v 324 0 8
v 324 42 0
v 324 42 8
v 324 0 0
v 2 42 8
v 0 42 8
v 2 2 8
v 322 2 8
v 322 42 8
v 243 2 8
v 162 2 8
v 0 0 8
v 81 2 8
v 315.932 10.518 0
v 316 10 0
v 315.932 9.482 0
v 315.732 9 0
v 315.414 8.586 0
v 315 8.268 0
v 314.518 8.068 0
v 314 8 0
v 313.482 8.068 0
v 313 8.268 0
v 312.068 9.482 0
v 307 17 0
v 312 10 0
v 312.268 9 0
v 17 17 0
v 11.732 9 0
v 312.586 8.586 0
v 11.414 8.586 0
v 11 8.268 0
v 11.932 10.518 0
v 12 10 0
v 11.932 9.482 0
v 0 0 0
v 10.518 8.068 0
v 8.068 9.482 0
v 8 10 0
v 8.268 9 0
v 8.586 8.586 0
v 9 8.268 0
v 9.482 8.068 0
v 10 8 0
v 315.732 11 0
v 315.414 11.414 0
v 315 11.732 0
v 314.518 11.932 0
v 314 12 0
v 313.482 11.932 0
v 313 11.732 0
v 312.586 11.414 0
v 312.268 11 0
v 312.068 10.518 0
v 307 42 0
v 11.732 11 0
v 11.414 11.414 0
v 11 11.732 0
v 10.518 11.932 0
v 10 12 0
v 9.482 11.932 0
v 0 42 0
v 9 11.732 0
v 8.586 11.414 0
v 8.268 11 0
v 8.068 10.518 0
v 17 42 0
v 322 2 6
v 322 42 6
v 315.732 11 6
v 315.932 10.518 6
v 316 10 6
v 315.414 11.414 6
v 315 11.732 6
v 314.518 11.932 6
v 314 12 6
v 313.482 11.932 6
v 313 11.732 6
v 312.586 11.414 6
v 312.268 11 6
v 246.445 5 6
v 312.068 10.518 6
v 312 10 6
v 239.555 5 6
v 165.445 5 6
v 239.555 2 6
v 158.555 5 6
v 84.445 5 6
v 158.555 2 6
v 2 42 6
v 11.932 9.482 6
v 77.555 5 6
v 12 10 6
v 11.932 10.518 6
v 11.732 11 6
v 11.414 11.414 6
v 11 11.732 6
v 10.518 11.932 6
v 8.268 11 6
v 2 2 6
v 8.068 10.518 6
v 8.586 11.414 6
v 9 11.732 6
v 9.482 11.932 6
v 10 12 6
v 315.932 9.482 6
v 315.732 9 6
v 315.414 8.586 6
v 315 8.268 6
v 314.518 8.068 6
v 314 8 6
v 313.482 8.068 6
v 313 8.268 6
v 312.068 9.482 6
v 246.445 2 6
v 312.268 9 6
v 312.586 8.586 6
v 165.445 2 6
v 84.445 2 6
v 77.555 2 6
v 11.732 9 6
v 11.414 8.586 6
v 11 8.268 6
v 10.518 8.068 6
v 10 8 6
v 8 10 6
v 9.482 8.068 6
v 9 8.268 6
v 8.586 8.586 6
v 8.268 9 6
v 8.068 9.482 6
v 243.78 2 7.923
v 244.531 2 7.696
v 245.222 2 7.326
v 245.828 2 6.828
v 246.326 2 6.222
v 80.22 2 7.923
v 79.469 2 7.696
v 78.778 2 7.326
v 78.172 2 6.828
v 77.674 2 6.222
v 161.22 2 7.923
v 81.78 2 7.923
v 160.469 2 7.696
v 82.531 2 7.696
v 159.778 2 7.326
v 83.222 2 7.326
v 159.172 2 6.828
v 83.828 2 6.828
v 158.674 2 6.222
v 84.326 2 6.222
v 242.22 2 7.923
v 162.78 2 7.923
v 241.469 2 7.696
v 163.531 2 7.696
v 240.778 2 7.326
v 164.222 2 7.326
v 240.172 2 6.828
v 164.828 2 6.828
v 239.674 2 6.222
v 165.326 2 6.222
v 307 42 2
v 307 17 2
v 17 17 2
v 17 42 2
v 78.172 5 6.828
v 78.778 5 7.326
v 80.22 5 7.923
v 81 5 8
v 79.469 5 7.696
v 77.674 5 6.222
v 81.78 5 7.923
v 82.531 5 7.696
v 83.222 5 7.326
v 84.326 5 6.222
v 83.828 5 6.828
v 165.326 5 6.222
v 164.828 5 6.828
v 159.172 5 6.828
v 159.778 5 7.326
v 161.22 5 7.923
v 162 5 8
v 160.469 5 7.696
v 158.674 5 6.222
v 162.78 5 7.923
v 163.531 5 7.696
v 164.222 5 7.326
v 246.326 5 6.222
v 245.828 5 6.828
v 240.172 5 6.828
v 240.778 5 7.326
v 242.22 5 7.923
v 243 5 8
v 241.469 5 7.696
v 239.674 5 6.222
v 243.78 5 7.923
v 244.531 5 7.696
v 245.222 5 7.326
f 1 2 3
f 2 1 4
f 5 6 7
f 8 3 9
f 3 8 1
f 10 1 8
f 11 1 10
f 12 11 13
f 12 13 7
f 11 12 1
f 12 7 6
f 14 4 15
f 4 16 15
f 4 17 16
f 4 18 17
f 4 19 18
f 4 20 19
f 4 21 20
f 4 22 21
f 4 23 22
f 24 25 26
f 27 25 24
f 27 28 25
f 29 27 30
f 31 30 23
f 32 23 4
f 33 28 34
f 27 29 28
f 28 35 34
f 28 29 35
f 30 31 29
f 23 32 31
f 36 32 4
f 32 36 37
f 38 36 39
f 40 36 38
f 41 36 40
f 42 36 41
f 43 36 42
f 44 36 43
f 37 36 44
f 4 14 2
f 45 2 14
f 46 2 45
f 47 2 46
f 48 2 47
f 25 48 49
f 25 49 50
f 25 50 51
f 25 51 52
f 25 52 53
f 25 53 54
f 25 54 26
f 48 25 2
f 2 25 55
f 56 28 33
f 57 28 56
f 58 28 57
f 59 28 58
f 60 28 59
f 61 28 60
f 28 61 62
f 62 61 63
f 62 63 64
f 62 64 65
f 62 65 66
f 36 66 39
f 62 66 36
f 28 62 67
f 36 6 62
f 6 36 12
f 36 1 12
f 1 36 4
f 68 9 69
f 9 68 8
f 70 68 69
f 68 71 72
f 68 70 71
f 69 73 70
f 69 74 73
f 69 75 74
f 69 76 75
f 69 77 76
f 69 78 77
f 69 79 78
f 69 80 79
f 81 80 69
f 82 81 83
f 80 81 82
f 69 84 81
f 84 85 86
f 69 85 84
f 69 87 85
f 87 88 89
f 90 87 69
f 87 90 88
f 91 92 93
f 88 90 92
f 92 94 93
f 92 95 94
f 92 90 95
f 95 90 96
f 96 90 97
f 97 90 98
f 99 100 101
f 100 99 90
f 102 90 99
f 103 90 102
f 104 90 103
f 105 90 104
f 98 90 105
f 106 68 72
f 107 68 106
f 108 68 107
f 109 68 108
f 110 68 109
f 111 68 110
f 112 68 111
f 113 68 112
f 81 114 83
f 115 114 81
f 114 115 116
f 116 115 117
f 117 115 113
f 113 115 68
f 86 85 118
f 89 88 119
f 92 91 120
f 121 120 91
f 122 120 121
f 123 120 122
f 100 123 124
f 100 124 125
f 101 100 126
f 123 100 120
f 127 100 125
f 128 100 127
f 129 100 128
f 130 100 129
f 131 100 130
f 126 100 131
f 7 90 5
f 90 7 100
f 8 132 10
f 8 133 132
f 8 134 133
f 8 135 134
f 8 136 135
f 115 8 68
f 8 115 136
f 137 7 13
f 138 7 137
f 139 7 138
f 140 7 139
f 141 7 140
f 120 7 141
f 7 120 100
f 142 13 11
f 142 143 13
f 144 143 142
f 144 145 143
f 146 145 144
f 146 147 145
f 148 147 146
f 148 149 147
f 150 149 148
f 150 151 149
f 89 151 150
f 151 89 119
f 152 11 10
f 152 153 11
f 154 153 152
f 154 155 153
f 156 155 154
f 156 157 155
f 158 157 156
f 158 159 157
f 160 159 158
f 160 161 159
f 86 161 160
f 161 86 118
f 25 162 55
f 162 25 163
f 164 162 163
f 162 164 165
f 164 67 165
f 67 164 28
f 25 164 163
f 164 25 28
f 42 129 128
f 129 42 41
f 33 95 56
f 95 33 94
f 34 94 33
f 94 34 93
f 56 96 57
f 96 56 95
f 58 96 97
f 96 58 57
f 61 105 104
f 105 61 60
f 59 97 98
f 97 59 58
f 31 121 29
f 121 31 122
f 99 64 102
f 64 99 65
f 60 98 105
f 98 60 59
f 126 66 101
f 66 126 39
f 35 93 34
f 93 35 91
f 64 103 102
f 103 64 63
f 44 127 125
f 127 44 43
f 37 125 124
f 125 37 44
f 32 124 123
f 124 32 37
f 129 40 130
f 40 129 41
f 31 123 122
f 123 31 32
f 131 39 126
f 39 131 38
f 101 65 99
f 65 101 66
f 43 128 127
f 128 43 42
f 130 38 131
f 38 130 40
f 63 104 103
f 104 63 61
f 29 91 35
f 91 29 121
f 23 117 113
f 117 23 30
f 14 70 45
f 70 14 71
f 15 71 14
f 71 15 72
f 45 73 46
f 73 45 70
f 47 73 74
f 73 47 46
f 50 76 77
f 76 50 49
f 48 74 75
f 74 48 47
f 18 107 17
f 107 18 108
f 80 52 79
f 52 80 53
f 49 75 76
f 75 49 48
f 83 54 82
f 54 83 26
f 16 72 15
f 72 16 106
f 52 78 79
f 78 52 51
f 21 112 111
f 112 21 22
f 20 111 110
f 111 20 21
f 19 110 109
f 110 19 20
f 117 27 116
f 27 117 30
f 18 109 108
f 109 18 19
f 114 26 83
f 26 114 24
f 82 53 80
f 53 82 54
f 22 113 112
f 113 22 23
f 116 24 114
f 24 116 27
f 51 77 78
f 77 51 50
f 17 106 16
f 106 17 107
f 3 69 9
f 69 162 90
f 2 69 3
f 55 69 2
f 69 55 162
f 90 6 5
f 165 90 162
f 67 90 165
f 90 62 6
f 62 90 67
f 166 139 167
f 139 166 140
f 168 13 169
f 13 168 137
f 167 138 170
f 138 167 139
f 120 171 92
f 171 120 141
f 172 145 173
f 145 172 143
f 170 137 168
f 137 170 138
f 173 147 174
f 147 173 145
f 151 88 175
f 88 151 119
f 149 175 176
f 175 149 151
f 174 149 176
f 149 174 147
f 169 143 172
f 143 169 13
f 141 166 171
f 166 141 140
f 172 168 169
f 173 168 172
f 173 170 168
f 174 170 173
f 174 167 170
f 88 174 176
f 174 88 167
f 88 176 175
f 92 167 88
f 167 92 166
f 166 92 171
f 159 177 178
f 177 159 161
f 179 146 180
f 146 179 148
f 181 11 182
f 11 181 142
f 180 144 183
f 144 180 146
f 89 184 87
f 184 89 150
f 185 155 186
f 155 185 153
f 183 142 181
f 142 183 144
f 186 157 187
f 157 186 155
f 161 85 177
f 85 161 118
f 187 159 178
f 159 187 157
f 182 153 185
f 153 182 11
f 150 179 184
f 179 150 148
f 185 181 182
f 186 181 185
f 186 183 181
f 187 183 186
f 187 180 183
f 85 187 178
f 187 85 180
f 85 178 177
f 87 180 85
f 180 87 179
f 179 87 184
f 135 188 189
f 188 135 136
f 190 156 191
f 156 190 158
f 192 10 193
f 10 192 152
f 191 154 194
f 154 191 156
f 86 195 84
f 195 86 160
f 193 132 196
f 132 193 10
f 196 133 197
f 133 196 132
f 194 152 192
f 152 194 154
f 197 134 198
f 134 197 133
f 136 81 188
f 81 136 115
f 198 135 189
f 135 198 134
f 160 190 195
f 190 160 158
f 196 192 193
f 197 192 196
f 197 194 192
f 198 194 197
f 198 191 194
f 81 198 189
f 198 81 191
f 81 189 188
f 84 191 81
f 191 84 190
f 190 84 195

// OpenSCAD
/*
 * 8x32 LED Panel Housing - VISUALIZATION MODE
 * This version shows a cutaway so you can see the wire holes clearly
 */

// Include all the same parameters
panel_length = 320;
panel_width = 80;
panel_thickness = 1.5;
housing_length = panel_length + 4;  // 324mm
housing_width = panel_width + 4;    // 84mm
housing_depth = 8;
wall_thickness = 2;
led_channel_depth = 2;
led_channel_width = panel_width;
led_channel_length = panel_length;
wire_hole_diameter = 6;
mounting_hole_dia = 4;
mounting_hole_inset = 10;

// CUTAWAY VIEW - shows internal structure
module cutaway_housing() {
    difference() {
        // Original housing
        difference() {
            cube([housing_length, housing_width, housing_depth]);
            
            // LED panel channel (front/top)
            translate([wall_thickness, wall_thickness, housing_depth - led_channel_depth])
                cube([led_channel_length, led_channel_width, led_channel_depth + 0.1]);
            
            // ===== 3 WIRE HOLES IN BACK WALL =====
            // Left hole
            translate([housing_length * 0.25, -0.1, housing_depth/2])
                rotate([-90, 0, 0])
                cylinder(h=wall_thickness + 0.2, d=wire_hole_diameter, $fn=32);
            
            // Center hole
            translate([housing_length * 0.50, -0.1, housing_depth/2])
                rotate([-90, 0, 0])
                cylinder(h=wall_thickness + 0.2, d=wire_hole_diameter, $fn=32);
            
            // Right hole
            translate([housing_length * 0.75, -0.1, housing_depth/2])
                rotate([-90, 0, 0])
                cylinder(h=wall_thickness + 0.2, d=wire_hole_diameter, $fn=32);
            
            // Weight reduction
            translate([wall_thickness + 15, wall_thickness + 15, -0.1])
                cube([housing_length - 2*wall_thickness - 30,
                      housing_width - 2*wall_thickness - 30,
                      wall_thickness + 0.1]);
            
            // Mounting holes
            translate([mounting_hole_inset, mounting_hole_inset, -0.1])
                cylinder(h=housing_depth + 0.2, d=mounting_hole_dia, $fn=24);
            translate([housing_length - mounting_hole_inset, mounting_hole_inset, -0.1])
                cylinder(h=housing_depth + 0.2, d=mounting_hole_dia, $fn=24);
            translate([mounting_hole_inset, housing_width - mounting_hole_inset, -0.1])
                cylinder(h=housing_depth + 0.2, d=mounting_hole_dia, $fn=24);
            translate([housing_length - mounting_hole_inset, housing_width - mounting_hole_inset, -0.1])
                cylinder(h=housing_depth + 0.2, d=mounting_hole_dia, $fn=24);
        }
        
        // CUT AWAY HALF to show interior
        translate([-1, housing_width/2, -1])
            cube([housing_length + 2, housing_width/2 + 2, housing_depth + 2]);
    }
}

// Show wire hole positions with colored markers
module wire_hole_markers() {
    // Left hole marker (RED)
    color("red", 0.8)
    translate([housing_length * 0.25, 0, housing_depth/2])
        rotate([-90, 0, 0])
        cylinder(h=5, d=wire_hole_diameter + 2, $fn=32);
    
    // Center hole marker (GREEN)
    color("green", 0.8)
    translate([housing_length * 0.50, 0, housing_depth/2])
        rotate([-90, 0, 0])
        cylinder(h=5, d=wire_hole_diameter + 2, $fn=32);
    
    // Right hole marker (BLUE)
    color("blue", 0.8)
    translate([housing_length * 0.75, 0, housing_depth/2])
        rotate([-90, 0, 0])
        cylinder(h=5, d=wire_hole_diameter + 2, $fn=32);
}

// RENDER
cutaway_housing();
wire_hole_markers();

// Add text labels
color("white")
translate([housing_length * 0.25 - 10, -10, housing_depth/2])
    text("LEFT", size=8);

color("white")
translate([housing_length * 0.50 - 15, -10, housing_depth/2])
    text("CENTER", size=8);

color("white")
translate([housing_length * 0.75 - 12, -10, housing_depth/2])
    text("RIGHT", size=8);

/*
 * VIEWING INSTRUCTIONS:
 * 
 * In OpenSCAD:
 * 1. Press F5 to preview
 * 2. Use mouse to rotate view
 * 3. Look at the BACK EDGE (narrow 84mm edge at y=0)
 * 4. You'll see 3 colored cylinders showing wire holes:
 *    - RED = Left hole (at 25%)
 *    - GREEN = Center hole (at 50%)
 *    - BLUE = Right hole (at 75%)
 * 
 * The cutaway shows the interior so you can see:
 * - Front LED channel (top surface)
 * - 3 wire holes going through back wall
 * - Mounting holes at corners
 */
